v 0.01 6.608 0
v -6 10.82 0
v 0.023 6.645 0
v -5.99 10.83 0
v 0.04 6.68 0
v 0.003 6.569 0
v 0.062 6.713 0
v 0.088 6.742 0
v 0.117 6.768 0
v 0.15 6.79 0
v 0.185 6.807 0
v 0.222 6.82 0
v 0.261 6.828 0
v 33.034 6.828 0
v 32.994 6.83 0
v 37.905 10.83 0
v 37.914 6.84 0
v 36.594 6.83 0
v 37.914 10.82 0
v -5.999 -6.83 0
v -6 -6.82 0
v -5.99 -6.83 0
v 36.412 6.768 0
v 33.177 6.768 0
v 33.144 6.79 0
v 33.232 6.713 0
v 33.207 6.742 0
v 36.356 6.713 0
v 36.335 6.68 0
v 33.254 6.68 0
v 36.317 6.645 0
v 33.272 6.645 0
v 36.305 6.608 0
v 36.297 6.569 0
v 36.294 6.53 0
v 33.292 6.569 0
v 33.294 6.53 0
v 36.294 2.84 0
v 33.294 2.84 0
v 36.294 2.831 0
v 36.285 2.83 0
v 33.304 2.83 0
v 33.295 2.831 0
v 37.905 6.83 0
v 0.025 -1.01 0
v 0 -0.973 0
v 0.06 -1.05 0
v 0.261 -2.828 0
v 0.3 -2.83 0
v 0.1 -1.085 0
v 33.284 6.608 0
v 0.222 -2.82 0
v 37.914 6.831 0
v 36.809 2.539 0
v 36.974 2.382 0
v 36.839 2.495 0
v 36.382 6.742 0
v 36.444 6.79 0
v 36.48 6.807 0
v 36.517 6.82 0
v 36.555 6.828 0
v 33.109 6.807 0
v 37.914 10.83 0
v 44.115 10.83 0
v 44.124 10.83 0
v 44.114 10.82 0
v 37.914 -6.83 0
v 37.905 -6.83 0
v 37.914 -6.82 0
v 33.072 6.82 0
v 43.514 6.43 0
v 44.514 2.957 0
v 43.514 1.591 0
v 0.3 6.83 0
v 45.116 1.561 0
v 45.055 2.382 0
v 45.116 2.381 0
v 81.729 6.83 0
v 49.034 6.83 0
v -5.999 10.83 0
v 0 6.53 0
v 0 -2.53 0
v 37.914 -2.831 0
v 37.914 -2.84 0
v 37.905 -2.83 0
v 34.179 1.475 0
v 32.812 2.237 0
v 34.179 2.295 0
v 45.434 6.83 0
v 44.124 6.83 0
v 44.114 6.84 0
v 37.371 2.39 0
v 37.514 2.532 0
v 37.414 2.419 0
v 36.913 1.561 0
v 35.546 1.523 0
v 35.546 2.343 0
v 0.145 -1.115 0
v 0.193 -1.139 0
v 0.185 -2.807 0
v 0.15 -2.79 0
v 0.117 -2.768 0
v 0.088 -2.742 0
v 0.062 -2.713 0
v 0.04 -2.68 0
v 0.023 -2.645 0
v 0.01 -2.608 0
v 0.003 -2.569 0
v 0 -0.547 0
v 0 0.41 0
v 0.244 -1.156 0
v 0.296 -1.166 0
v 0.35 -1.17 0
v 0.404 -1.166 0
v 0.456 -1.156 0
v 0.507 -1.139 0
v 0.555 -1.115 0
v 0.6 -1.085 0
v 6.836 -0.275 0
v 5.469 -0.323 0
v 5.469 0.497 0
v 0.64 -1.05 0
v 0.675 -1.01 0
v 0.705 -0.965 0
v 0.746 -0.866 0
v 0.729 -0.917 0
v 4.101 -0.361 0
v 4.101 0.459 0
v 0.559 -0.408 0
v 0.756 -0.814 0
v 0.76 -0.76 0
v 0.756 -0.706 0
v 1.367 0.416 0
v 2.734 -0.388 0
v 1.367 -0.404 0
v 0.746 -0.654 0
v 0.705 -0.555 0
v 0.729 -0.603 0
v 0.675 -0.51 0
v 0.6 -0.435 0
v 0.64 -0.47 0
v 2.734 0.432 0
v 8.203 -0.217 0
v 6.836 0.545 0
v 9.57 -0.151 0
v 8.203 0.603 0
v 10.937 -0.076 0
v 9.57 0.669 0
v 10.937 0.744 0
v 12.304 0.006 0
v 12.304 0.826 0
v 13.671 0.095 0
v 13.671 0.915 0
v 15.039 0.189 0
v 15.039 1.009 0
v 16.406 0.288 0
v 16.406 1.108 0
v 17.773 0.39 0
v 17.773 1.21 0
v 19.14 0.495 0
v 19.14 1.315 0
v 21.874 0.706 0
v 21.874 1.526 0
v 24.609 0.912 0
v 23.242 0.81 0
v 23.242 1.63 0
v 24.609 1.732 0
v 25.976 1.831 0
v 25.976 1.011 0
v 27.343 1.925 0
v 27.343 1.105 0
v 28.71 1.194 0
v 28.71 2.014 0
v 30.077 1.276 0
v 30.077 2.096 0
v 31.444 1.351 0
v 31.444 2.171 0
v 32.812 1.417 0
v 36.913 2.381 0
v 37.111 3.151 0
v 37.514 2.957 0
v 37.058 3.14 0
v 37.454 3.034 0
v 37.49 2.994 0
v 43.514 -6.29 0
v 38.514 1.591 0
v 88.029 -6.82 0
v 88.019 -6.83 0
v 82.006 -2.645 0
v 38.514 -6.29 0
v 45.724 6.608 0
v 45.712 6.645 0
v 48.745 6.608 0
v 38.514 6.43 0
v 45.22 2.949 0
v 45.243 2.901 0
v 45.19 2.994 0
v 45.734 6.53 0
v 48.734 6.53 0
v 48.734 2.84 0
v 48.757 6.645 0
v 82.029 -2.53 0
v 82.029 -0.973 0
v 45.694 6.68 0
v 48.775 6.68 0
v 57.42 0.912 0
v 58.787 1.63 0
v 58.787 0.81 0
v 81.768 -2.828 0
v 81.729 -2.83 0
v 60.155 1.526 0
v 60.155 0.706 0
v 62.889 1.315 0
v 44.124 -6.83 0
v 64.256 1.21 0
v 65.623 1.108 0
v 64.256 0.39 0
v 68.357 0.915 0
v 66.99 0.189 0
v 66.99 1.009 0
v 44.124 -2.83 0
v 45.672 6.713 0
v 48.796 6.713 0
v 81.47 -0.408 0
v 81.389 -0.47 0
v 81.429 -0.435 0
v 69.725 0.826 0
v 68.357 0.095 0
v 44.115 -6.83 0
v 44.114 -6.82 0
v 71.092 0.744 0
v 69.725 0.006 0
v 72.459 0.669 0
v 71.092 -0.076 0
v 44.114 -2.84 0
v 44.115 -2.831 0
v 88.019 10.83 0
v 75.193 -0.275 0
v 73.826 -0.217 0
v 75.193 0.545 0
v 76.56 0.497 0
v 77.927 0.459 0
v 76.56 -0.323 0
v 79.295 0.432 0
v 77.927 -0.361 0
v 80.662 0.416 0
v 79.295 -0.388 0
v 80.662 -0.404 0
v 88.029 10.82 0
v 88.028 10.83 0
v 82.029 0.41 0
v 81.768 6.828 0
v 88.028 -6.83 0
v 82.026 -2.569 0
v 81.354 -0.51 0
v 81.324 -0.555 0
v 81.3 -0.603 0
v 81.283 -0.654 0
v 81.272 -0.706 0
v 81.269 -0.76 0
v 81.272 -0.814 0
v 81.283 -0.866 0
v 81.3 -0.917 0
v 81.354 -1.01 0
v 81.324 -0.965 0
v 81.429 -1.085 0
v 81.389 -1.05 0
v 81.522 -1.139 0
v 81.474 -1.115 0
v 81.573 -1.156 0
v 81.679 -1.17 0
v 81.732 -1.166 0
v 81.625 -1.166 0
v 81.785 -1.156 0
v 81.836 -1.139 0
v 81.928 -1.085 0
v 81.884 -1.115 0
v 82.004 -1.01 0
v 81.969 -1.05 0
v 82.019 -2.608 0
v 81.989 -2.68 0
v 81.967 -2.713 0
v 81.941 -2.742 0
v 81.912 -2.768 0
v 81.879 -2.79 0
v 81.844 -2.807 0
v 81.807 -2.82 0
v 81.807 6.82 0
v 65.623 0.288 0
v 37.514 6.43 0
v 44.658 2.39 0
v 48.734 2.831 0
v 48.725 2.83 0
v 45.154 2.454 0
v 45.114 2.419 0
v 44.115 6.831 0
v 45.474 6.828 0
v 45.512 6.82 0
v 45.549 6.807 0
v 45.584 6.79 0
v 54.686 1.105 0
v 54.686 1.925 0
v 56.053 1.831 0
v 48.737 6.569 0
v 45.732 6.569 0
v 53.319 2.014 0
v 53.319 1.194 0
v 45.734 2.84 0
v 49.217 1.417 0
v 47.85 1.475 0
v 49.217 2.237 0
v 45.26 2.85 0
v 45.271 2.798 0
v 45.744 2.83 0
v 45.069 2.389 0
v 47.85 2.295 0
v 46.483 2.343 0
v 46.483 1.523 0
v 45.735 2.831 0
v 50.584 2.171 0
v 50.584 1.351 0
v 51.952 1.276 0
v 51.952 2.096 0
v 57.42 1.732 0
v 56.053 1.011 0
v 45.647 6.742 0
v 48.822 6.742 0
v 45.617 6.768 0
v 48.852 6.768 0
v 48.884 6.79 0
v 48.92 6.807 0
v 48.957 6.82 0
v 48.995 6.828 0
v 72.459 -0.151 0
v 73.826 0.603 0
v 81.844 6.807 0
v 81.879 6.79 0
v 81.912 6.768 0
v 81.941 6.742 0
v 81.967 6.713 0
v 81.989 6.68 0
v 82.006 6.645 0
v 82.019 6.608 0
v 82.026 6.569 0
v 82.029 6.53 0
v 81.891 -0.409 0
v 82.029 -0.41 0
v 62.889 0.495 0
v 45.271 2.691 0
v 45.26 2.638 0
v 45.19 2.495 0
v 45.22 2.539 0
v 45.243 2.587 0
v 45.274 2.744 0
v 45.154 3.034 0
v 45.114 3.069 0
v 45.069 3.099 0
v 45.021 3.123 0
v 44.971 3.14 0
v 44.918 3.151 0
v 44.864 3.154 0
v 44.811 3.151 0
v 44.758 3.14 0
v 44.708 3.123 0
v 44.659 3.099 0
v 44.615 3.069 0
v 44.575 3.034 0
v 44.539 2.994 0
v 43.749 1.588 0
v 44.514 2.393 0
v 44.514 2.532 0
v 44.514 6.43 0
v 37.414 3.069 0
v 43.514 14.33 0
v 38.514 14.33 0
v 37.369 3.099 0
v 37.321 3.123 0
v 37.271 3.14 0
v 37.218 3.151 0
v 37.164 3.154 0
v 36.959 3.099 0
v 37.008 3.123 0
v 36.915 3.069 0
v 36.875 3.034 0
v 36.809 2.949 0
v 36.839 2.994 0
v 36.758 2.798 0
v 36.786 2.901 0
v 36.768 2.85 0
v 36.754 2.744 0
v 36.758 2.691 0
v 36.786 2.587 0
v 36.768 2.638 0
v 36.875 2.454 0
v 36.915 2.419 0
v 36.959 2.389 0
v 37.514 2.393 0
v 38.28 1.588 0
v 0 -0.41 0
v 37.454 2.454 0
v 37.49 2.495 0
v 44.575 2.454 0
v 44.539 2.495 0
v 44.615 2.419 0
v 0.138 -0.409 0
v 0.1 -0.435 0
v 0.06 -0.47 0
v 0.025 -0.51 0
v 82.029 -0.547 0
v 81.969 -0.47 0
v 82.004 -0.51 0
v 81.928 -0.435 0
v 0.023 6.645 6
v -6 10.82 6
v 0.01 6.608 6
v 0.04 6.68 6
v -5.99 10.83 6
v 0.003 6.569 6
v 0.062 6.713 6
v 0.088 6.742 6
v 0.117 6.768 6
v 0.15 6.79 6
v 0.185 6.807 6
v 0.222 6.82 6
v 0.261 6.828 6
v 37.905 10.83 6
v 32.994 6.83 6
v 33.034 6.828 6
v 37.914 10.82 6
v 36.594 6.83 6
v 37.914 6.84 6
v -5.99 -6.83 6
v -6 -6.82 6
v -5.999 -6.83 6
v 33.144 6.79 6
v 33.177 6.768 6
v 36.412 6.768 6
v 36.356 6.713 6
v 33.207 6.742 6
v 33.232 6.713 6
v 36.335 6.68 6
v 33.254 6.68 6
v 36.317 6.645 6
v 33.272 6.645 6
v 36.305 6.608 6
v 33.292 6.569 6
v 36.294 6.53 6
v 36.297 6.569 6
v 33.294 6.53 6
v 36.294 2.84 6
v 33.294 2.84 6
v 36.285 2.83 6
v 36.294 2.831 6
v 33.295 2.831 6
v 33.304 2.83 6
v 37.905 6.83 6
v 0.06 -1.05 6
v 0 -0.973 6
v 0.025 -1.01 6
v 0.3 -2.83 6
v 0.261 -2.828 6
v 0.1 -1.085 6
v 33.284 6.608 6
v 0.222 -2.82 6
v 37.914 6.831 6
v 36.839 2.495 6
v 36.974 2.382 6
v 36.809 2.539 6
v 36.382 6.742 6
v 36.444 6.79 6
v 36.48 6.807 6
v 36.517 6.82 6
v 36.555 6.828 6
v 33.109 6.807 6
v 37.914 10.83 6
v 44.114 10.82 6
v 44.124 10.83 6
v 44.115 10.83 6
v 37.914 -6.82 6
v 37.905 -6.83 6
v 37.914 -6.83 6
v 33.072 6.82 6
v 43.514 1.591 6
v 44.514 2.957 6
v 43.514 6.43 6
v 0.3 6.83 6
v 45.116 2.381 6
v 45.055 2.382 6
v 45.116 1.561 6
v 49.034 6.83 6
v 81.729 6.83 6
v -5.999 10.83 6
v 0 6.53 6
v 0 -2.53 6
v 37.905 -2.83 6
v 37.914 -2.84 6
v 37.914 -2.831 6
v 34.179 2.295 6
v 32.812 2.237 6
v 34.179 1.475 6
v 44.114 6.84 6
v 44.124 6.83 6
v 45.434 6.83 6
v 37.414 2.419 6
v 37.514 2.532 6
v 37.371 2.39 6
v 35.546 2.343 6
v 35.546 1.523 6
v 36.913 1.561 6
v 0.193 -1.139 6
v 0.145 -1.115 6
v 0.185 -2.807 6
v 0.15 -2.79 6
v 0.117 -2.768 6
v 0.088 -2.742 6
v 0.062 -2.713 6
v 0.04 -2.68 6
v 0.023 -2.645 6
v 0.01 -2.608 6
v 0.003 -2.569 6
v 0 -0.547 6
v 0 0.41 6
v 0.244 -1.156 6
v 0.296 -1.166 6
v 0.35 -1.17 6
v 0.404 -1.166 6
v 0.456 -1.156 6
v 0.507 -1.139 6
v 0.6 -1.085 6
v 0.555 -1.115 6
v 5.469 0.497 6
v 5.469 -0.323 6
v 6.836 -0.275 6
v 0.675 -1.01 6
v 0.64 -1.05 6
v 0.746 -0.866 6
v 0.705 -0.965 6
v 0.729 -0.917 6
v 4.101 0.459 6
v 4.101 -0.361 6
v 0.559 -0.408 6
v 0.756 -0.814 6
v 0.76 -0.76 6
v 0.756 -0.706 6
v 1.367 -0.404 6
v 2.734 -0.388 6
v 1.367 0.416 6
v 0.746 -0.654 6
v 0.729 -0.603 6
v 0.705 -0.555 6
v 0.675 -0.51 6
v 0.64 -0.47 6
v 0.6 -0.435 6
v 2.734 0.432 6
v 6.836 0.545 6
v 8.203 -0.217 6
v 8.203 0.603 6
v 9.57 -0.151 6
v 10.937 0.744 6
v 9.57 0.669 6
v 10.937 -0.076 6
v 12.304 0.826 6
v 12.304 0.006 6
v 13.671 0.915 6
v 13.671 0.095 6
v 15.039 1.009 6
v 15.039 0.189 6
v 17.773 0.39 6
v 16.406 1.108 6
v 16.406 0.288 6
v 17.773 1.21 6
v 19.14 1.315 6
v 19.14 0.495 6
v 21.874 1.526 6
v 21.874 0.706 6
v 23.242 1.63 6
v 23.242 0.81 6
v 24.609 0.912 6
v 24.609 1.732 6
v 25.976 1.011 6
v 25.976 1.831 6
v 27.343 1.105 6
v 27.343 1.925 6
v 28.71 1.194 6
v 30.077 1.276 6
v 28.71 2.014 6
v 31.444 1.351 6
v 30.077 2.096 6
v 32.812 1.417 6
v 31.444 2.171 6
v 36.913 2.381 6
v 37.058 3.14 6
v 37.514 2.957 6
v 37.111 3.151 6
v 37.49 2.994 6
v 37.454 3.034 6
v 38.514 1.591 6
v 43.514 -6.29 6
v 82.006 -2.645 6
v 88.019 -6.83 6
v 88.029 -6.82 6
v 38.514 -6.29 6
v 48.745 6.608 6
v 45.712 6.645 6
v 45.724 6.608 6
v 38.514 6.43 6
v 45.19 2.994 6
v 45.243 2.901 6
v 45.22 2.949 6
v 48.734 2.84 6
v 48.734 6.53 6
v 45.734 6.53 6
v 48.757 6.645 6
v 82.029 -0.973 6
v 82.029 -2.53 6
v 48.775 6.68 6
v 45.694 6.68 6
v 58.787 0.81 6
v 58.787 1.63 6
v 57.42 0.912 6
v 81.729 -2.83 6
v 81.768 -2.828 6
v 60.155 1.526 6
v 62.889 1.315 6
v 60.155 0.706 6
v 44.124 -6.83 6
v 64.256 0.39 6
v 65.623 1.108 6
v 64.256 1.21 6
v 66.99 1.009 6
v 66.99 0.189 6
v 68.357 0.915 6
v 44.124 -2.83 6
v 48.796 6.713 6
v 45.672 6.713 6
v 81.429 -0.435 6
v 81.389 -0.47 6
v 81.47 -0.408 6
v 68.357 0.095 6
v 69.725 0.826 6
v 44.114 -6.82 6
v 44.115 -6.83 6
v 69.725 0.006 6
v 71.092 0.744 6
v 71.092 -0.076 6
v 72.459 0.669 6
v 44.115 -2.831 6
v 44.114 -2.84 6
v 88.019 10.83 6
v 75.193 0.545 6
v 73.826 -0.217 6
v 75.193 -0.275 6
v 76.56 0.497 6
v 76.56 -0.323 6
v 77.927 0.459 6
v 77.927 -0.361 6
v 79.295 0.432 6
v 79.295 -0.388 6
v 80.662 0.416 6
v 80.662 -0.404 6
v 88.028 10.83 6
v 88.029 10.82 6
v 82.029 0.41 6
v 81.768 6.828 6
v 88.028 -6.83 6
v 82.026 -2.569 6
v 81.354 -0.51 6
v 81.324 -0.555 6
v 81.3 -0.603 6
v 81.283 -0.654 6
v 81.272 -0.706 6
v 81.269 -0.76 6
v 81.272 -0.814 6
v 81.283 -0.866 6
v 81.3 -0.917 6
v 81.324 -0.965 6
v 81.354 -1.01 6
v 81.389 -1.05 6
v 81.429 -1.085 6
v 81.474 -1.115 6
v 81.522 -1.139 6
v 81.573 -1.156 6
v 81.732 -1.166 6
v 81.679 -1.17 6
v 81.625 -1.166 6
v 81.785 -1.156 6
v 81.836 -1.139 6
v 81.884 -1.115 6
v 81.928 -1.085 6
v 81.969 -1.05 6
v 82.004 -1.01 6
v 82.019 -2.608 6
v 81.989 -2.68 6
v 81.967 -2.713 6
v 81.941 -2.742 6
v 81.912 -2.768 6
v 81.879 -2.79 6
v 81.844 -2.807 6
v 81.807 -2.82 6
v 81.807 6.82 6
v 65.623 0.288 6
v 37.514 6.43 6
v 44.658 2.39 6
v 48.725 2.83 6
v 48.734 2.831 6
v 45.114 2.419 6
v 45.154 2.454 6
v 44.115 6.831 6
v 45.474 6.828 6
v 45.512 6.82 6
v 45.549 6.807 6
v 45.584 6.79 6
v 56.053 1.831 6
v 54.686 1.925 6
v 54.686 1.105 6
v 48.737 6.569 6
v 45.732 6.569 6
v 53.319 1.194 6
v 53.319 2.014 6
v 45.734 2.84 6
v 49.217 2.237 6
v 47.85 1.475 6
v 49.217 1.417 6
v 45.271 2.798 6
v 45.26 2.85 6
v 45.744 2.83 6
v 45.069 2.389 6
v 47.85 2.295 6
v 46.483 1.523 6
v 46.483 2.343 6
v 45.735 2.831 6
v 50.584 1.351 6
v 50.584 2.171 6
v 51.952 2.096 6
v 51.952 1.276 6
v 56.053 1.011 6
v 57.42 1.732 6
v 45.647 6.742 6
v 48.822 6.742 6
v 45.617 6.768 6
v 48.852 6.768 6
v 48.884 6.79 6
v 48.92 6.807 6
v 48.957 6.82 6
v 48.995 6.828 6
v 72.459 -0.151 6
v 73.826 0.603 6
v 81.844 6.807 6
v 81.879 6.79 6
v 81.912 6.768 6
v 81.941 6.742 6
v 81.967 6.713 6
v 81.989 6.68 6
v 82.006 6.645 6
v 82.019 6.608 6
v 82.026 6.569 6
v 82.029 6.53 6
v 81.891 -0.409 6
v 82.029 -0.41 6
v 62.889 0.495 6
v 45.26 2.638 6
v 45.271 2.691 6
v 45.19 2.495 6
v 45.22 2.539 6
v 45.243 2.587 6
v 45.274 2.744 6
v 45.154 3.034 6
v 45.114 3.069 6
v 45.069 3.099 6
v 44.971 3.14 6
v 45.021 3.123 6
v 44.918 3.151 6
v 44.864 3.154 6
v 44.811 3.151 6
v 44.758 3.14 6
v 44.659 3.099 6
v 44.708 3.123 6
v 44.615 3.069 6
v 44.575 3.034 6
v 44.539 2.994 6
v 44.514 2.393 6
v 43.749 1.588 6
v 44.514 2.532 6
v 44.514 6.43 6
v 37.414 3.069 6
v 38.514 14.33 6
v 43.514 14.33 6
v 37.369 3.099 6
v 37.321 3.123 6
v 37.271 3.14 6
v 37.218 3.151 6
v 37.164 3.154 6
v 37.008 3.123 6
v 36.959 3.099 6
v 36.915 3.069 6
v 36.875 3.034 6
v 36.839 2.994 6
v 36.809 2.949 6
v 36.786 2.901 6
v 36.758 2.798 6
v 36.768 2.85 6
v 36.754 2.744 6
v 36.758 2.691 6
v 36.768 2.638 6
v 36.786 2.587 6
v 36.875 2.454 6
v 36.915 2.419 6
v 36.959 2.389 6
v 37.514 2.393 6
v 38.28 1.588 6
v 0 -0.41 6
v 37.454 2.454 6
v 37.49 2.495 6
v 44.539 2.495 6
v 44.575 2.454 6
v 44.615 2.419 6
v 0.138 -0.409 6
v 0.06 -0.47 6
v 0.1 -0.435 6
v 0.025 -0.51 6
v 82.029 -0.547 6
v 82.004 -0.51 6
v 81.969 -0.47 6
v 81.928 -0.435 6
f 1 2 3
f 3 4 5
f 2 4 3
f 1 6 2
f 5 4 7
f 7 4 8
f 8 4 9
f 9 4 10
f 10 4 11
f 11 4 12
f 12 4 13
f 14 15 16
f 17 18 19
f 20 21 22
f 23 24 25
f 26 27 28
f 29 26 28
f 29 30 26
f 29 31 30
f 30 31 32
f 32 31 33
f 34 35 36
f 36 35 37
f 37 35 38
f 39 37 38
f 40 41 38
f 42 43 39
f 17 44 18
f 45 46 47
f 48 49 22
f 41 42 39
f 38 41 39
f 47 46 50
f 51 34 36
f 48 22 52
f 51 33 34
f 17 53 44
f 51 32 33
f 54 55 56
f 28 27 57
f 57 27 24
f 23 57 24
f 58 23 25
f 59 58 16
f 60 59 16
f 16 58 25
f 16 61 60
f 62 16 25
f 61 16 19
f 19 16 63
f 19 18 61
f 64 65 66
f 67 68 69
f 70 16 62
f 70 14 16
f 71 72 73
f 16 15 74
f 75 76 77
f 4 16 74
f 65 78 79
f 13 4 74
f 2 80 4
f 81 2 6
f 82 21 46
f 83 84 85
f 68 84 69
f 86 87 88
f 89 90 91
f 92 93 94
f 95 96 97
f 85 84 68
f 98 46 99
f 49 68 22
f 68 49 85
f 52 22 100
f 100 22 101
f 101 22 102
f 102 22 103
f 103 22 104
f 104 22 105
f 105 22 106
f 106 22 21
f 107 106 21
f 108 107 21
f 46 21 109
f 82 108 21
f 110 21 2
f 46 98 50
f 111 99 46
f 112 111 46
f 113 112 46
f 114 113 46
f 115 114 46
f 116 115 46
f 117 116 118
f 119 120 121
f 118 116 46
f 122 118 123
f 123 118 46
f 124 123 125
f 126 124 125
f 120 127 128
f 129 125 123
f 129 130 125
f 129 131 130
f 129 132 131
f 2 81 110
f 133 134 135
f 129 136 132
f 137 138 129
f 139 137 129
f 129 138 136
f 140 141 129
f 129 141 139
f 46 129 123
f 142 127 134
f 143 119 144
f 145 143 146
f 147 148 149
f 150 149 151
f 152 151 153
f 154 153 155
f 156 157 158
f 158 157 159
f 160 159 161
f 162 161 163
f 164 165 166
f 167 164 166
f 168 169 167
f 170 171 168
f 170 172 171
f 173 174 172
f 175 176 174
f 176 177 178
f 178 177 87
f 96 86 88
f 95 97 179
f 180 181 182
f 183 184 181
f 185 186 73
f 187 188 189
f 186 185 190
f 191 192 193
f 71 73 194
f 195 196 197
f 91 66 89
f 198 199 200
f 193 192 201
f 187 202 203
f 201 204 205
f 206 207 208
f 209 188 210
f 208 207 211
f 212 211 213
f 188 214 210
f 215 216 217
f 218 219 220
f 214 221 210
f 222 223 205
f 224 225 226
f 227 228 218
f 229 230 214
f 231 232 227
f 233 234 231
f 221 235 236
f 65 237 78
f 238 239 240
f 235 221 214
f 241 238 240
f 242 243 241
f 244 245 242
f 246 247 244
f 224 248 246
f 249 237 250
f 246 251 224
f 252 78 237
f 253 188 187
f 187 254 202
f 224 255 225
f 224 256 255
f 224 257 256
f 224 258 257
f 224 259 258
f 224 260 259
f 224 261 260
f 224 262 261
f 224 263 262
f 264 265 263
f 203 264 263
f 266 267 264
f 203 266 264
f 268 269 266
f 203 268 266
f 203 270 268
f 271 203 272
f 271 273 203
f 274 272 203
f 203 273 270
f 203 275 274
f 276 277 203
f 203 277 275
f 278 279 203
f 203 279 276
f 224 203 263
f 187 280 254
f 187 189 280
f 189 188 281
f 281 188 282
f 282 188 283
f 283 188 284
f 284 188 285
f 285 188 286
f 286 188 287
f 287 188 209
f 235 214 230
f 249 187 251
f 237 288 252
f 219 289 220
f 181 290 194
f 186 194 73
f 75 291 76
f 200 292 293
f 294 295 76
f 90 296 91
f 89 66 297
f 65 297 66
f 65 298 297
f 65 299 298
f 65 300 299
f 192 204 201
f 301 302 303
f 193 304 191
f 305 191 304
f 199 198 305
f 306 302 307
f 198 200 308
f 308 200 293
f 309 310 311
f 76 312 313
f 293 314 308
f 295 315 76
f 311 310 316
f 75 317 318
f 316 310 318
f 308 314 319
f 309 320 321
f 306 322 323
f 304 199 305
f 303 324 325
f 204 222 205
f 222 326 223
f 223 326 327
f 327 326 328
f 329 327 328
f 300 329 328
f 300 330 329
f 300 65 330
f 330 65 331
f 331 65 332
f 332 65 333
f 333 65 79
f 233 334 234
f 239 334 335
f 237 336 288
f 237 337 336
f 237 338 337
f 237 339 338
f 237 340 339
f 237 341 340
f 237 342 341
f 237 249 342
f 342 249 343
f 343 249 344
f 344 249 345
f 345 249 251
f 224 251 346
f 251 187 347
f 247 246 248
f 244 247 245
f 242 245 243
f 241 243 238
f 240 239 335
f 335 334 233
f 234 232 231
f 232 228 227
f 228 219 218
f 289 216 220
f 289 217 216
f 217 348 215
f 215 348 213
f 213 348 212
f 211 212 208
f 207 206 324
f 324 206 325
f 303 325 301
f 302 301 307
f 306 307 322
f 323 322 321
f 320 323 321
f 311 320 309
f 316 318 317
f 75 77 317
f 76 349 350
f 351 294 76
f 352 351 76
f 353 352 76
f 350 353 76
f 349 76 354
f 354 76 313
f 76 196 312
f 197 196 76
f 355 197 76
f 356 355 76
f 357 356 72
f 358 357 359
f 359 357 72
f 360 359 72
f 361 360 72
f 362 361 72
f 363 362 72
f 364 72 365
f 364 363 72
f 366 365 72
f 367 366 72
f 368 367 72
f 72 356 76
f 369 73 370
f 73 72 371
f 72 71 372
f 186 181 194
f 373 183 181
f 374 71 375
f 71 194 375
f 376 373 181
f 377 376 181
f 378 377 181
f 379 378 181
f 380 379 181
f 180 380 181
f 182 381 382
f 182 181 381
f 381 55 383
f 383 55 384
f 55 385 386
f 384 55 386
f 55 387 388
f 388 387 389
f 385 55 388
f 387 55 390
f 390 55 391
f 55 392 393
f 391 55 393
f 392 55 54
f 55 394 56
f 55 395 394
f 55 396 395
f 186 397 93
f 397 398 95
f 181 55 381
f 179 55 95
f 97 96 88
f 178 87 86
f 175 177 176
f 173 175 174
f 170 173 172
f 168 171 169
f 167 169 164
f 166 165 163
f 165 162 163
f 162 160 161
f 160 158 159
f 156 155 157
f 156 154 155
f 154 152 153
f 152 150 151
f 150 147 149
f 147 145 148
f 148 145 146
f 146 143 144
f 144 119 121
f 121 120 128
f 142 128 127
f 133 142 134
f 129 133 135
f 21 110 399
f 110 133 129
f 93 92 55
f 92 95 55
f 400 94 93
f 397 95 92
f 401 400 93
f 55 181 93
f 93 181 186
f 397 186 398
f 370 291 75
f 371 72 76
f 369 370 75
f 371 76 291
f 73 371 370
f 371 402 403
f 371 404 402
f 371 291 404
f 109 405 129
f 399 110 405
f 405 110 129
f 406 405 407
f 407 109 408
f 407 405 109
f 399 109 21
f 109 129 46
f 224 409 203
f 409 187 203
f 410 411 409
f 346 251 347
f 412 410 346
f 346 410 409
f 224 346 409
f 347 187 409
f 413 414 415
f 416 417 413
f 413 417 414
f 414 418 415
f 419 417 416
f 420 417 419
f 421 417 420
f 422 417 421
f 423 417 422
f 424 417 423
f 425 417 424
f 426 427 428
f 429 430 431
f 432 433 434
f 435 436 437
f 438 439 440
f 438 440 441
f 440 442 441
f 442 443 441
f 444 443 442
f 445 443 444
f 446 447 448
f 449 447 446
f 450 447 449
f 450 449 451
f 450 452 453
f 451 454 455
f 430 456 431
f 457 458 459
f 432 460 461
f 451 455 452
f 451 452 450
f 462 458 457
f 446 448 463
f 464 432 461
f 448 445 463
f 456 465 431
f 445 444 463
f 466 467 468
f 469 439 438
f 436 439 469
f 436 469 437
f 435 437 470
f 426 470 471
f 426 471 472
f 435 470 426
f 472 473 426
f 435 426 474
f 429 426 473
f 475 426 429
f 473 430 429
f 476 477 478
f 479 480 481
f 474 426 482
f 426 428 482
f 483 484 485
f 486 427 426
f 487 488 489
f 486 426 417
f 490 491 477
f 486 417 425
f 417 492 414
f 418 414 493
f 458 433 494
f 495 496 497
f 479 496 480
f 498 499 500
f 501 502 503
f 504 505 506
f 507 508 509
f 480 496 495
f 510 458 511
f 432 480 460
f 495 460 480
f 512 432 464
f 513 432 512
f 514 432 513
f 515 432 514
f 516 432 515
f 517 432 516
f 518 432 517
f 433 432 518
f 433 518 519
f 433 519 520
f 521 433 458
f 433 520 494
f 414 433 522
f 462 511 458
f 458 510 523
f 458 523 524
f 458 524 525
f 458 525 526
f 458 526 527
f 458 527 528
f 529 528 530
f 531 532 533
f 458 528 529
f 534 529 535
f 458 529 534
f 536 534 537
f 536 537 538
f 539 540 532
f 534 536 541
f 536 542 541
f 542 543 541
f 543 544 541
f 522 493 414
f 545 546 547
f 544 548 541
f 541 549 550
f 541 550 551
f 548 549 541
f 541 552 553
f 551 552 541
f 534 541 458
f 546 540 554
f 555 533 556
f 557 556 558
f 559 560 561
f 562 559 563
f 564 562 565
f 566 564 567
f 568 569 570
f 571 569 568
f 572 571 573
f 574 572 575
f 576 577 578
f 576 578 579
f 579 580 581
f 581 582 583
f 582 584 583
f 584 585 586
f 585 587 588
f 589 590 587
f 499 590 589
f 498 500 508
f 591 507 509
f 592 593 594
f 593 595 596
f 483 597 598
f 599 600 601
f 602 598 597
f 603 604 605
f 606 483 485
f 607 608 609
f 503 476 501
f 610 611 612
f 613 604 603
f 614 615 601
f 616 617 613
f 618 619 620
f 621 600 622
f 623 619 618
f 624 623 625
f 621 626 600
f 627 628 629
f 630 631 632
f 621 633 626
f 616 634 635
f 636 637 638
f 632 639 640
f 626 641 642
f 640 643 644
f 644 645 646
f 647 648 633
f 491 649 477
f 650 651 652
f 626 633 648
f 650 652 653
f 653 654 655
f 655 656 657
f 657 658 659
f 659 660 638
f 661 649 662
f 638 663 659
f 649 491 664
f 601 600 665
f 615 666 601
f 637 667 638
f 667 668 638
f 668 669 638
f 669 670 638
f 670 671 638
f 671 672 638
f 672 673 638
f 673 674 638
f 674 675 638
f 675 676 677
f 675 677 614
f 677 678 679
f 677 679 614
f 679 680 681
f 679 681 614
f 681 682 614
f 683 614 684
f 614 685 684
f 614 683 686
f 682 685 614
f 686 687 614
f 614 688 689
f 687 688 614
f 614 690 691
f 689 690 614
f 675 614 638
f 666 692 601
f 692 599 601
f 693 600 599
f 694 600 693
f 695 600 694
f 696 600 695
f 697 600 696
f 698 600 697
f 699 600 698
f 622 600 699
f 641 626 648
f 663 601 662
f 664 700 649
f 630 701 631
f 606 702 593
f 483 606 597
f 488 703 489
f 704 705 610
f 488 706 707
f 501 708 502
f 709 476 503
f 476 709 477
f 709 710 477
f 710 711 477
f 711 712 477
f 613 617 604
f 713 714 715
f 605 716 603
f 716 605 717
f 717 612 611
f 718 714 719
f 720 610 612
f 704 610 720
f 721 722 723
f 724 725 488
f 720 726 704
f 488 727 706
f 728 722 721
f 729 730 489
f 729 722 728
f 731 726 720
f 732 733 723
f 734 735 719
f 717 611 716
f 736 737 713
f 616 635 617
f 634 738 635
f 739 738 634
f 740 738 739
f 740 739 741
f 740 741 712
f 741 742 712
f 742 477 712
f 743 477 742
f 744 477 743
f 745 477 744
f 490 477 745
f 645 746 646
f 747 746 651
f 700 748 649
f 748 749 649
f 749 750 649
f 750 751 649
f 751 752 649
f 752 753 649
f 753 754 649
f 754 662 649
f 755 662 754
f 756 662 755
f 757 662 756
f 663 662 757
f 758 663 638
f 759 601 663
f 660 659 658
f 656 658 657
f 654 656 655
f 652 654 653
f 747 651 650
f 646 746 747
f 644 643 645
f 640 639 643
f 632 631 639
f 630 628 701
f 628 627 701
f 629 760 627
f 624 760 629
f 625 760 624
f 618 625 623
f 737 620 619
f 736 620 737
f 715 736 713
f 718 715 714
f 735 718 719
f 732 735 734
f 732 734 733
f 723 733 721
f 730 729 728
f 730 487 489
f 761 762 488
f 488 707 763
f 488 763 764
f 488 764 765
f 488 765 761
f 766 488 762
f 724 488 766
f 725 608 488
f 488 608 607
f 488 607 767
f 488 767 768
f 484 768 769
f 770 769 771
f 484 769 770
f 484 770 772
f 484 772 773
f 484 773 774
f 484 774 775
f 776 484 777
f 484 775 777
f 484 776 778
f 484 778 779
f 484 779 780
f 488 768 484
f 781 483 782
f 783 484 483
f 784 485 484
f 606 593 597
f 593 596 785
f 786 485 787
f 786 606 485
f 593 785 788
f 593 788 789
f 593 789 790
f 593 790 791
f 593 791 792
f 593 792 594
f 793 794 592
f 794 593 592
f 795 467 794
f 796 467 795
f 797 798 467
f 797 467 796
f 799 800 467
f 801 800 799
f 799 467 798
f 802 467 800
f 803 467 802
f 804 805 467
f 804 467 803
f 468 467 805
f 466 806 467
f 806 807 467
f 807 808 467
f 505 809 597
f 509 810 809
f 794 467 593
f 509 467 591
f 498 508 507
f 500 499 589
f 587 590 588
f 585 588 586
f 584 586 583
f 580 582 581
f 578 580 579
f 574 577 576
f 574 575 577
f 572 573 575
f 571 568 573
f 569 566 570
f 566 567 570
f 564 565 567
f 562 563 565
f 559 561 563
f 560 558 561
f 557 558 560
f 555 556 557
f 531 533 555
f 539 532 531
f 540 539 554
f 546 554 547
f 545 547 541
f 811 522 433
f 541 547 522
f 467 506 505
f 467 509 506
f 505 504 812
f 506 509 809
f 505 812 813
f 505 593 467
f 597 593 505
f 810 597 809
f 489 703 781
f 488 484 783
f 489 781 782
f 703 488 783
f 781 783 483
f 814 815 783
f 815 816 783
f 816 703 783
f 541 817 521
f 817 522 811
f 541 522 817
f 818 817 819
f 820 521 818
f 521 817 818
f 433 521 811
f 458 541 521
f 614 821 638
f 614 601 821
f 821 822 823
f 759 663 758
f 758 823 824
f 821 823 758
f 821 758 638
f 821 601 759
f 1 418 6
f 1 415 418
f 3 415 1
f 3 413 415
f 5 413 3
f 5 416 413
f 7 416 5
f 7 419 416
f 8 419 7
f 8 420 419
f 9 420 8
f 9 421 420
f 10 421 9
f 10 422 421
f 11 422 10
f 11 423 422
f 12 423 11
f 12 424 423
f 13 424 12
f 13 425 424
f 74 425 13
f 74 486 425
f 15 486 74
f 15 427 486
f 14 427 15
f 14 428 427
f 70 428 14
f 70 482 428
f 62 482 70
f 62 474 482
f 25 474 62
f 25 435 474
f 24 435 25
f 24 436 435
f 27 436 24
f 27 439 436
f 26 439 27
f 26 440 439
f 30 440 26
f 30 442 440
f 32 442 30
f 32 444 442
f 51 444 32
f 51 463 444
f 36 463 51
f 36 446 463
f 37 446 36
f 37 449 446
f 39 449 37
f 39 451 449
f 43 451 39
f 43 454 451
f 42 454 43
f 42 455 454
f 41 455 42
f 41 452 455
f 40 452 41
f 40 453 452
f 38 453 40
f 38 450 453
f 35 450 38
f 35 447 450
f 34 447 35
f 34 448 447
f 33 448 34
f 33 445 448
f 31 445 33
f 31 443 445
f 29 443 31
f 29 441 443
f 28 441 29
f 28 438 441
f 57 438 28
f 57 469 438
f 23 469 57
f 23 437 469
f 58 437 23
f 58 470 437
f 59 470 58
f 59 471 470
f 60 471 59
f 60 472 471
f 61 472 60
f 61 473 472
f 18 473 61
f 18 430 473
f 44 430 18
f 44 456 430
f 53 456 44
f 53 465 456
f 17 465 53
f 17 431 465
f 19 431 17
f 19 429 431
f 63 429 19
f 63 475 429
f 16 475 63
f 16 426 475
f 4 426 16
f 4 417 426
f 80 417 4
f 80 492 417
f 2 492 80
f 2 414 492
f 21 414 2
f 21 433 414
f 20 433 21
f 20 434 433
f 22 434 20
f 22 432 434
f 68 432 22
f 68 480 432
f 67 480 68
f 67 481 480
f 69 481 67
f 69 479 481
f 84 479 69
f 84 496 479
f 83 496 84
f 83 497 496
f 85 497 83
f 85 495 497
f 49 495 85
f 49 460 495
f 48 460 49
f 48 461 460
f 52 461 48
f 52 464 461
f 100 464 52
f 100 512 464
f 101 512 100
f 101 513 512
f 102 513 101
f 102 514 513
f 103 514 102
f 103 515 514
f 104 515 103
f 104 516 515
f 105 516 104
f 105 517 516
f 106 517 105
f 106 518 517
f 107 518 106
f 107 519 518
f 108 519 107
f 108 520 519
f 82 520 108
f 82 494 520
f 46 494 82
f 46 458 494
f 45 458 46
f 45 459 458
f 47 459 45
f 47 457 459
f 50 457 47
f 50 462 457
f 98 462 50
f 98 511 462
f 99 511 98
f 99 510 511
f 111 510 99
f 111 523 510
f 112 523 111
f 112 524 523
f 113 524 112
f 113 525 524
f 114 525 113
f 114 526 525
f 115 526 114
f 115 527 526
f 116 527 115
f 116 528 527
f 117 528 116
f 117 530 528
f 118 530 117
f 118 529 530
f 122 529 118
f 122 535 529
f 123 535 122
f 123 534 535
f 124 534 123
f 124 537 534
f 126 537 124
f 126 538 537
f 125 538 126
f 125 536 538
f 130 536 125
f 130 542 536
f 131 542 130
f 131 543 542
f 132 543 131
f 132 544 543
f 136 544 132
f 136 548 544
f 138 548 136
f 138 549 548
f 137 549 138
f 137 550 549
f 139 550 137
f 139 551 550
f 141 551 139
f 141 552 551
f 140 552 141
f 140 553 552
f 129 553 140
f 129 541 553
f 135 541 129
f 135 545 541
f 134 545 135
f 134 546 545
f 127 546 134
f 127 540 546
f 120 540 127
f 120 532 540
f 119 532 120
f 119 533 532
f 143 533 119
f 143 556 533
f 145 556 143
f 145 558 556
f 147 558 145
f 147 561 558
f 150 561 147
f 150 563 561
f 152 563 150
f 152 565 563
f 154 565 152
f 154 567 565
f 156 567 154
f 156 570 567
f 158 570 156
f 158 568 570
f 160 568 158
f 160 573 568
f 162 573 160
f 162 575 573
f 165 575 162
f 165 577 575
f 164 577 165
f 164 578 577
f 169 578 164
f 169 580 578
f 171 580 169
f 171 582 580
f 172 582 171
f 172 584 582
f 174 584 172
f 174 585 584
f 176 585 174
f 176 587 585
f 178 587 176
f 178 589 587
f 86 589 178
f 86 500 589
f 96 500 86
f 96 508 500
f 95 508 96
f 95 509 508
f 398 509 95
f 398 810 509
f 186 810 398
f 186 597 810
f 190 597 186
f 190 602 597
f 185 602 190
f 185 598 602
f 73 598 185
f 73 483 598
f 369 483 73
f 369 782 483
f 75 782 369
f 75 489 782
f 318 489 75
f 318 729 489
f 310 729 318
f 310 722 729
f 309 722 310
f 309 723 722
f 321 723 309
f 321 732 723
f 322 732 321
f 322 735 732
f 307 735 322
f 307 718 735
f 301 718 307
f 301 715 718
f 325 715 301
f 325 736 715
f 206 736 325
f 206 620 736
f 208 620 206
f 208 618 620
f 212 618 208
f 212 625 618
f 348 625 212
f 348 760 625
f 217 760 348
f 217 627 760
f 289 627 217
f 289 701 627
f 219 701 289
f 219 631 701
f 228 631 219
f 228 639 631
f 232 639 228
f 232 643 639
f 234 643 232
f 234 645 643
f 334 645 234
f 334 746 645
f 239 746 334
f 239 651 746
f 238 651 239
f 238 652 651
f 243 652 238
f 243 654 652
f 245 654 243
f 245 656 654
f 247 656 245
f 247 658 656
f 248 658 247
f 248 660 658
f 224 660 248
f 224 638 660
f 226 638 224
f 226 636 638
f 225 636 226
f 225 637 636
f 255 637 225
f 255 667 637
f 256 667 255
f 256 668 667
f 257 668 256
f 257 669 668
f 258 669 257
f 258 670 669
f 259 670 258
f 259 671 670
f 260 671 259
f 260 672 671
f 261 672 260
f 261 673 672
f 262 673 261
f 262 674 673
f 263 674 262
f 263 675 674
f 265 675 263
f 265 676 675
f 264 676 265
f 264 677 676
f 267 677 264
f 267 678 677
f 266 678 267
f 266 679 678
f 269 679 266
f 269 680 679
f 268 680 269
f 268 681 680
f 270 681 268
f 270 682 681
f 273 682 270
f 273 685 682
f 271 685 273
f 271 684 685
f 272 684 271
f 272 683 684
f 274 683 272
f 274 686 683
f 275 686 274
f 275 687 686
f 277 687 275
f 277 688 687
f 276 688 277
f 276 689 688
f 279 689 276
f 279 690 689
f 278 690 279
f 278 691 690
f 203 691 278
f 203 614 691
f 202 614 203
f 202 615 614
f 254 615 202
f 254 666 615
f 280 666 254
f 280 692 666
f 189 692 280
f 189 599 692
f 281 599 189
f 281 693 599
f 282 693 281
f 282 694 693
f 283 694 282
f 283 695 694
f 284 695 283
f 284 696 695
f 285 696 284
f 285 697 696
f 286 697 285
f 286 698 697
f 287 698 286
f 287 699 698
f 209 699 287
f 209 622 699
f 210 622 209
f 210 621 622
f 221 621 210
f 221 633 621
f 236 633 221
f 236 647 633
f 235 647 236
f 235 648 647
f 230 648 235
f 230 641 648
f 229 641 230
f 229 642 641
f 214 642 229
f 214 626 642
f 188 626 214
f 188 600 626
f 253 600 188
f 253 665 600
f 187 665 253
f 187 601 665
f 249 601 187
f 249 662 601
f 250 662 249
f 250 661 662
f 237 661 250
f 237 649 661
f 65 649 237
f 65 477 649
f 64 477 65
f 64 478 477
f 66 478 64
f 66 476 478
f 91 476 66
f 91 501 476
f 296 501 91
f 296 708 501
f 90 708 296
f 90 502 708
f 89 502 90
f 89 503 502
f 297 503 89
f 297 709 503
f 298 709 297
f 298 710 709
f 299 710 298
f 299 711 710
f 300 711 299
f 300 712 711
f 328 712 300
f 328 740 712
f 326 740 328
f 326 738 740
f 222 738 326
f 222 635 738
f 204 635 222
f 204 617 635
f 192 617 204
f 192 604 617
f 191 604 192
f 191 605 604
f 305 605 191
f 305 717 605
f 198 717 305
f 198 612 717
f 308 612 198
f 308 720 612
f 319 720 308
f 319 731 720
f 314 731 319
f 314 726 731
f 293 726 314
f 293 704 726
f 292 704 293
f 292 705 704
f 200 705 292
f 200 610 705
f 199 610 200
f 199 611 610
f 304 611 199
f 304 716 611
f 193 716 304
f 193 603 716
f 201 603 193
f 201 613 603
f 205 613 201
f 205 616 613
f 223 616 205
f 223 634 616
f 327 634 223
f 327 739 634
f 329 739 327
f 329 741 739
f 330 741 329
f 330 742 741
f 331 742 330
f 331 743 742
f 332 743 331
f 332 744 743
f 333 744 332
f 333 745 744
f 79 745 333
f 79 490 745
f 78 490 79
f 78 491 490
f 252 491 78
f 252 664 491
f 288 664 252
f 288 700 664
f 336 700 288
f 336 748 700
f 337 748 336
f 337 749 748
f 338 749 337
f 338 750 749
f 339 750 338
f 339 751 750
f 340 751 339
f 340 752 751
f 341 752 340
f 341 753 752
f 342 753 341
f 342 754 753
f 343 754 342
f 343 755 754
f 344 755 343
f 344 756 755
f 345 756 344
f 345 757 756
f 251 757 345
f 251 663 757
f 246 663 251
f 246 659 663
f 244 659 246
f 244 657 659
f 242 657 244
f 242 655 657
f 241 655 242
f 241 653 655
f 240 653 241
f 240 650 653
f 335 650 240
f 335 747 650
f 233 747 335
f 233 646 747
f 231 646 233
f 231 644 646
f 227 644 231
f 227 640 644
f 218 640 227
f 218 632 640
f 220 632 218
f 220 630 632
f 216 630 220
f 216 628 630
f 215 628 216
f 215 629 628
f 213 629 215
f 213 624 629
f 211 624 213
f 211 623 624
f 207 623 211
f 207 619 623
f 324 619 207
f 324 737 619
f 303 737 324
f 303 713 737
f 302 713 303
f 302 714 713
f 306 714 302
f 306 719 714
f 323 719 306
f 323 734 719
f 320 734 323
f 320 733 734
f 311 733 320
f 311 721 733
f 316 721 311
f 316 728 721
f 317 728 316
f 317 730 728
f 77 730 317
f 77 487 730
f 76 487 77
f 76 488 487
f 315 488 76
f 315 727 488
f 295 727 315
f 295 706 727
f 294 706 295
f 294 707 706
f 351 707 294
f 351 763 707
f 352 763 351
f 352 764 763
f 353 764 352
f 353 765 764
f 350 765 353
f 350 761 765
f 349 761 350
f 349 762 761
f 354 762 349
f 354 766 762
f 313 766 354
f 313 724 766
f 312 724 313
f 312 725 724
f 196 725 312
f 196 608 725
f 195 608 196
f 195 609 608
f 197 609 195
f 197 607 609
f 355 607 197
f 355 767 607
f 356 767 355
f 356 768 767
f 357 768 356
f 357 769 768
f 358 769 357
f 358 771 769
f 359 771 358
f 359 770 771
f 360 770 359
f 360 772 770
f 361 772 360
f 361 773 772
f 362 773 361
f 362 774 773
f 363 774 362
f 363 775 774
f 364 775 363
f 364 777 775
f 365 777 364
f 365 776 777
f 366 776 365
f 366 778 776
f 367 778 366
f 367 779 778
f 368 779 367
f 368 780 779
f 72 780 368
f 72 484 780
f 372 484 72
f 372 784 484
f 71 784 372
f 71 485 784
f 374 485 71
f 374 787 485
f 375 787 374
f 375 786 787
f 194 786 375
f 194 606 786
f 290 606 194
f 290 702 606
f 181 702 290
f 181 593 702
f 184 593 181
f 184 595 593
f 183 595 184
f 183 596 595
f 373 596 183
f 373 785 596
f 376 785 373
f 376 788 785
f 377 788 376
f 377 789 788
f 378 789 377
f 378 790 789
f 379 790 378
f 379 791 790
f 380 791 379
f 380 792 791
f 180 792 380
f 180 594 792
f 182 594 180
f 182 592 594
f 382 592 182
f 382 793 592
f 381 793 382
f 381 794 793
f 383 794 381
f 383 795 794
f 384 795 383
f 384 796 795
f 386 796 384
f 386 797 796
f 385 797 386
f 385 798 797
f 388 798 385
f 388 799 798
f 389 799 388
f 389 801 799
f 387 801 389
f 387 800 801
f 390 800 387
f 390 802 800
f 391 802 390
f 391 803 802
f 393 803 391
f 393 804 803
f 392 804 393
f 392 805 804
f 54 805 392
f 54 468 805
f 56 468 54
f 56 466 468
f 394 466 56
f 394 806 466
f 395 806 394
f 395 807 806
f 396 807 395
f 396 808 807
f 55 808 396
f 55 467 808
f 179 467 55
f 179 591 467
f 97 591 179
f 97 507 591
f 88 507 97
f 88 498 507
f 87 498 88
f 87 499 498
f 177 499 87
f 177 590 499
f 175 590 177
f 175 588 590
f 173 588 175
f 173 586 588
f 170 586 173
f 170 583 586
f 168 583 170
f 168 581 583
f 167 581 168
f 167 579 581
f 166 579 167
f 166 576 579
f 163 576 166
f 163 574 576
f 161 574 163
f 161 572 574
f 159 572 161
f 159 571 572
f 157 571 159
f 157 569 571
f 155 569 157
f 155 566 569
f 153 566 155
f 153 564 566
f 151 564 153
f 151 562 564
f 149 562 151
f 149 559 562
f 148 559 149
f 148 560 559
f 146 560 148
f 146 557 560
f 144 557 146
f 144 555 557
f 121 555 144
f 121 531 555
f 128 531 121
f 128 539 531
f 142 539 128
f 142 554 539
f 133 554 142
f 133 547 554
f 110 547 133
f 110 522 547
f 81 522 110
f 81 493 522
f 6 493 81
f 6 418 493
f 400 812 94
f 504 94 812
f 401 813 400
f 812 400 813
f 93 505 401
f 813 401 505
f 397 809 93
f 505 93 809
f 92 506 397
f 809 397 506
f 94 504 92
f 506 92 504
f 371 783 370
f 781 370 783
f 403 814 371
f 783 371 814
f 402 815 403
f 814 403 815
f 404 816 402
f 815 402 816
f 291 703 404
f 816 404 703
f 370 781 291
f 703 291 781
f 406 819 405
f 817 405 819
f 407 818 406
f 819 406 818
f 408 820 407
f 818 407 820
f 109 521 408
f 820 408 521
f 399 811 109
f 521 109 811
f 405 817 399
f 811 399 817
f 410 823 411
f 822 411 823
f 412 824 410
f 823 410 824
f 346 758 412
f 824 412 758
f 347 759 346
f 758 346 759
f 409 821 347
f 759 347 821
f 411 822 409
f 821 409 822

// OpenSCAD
// bistable-toggle — a fixed–fixed pre-buckled arch that snaps between two
// stable states. Reference design for docs/advanced-techniques.md Domain 1
// (compliant mechanisms) → bistable & constant-force, and CC1.
//
// A fixed–fixed buckled arch has two stable states (bowed up / bowed down)
// separated by a negative-stiffness region: power is needed only to SWITCH, not
// to HOLD. Press the proud push stem past flat and the arch snaps to the other
// state and stays. The stems are a mirrored pair riding the arch centre through
// windows in the lid and base bar: whichever state the toggle is in, exactly
// one stem stands proud of the cage, and pressing it is the next switch — one
// motion of one finger, in both states (PR #406 review: a caged nub with no
// reachable push face reads as welded — a dead button). Latches, closures,
// tactile toggles.
//
// DIMENSIONED FROM TARGETS (issue #389), not by feel. Pick the switch force
// f_s and travel u_tr, then invert the doc's two nondimensional constants
// (fixed–fixed shallow arch, I = w·t³/12):
//   switch force   f_s · l³ / (E·I·h) = 1486.57
//   travel         u_tr / h           = 1.98
// Defaults f_s = 3 N, u_tr = 4 mm, E = 2 GPa (PETG datum) give
//   h = u_tr/1.98 = 2.02 mm               (mid_rise, derived below)
//   t = 0.82 mm — bistability needs h/t ≥ 2.3, capping t at 0.878 mm, and the
//        repo floor is 0.8 (two perimeters): the window is [0.8, 0.878], and
//        0.82 sits a hair above the floor so the curved band's normal-ray
//        wall samples clear the 0.8 mm thin-wall check
//   l = (1486.57·E·I·h/f_s)^(1/3) ≈ 82 mm (span, derived below)
// main() re-derives f_s and u_tr from the built parameters and echoes them, so
// the solve cannot silently drift; NOTES.md "The solve" records the chain.
//
// BISTABILITY CONDITION: a fixed–fixed arch is only bistable when the rise is
// tall enough vs the beam thickness (mid_rise/beam_t ≳ 2.3). Asserted below —
// too flat and it just springs back (monostable). The coupon (part = "sweep")
// prints four cells across that threshold, two deliberately monostable, so you
// can feel where bistability dies on your printer.
//
// HARD STOPS (the doc's fatigue rule: the real limit is off-axis overload, not
// primary-DOF motion): the nub travels in a rigid cage — the lid above limits
// +Y over-travel, the base bar below limits −Y, and two rails hanging from the
// lid flank the raised nub to limit ±X shoves. The rails stop `stop_gap` above
// the arch's maximum reach: the arch sweeps through every interior x between
// states, so a stop reaching any lower would weld the mechanism solid. Z
// (out-of-plane) is left to geometry: that axis is (w/t)² ≈ 56× stiffer than
// the flexure axis. The `fitcheck` part proves the cage clears the arch's and
// nub's FULL travel; `fitcheck_neg` proves that check can fail.
//
// PUSH ACCESS vs STOP DUTY (the PR #406 reconciliation — stops moved OUTSIDE
// the push column): the lid and base bar carry stem windows, so the +Y stop is
// no longer the full lid over the nub — it is the nub's shoulders (the
// nub[0]-wide body outboard of the stem) catching the lid-window JAMBS, at the
// same `stop_gap`. The −Y stop stays the arch underside meeting the base bar,
// now at the jambs beside its window: first contact ≈ stop_gap + the arch's
// curvature drop across the half-window (≈ 0.03 mm here — sub-layer noise,
// stated rather than compensated with an unprintable 0.03 mm ledge). The stems
// carry NO root gussets, deliberately: their roots sit inside the nub-
// rigidized centre span (|x−l/2| ≤ nub[0]/2) where cyclic strain is ~zero, and
// gusset bumps there would demand windows too wide to keep the nub→jamb stop.
// The stem↔jamb clearance is `stem_clear` > stop_gap so the ±X rails always
// bite before a stem can touch its jamb — the stops keep their designed order.
//
// PRINT FLAT. The profile is in XY; the arch snaps in-plane, so bending stress
// runs across the roads within a layer — the #1 flexure rule. The stop cage
// too is pure profile: every feature prints face-down on the bed, no bridges,
// no supports. All dims in mm.

/* [Targets — the geometry solves from these] */
// Target switch force f_s (N) — finger-comfortable toggle (brief #389)
target_fs = 3;
// Target centre travel u_tr (mm) — a positive, feelable click
target_utr = 4;
// Young's modulus (MPa). PETG ≈ 2000 — the datum the force solve uses; the
// echoed f_s is a prediction to verify with the coupon, not a guarantee.
E = 2000;

/* [Arch] */
// Mid-rise h (mm) — derived: u_tr / 1.98. Bigger = firmer snap, more travel.
mid_rise = target_utr / 1.98;
// Arch beam thickness t (mm) — bistability (h/t ≥ 2.3) caps it at 0.878 and
// the repo's two-perimeter floor is 0.8; 0.82 sits just off the floor so the
// curved band's normal-ray wall samples clear the 0.8 mm thin-wall check.
beam_t = 0.82;
// Out-of-plane width w (mm) = extrude height Z. Brief floor: w ≥ 3.
width = 6;
// Clamped span l (mm) — derived from target_fs: cbrt(1486.57·E·I·h/f_s)
span = pow(1486.57 * E * (width * pow(beam_t, 3) / 12) * mid_rise / target_fs, 1 / 3);

/* [Frame & stops] */
// Post width at each clamped end, X (mm)
post_w = 6;
// Frame wall thickness (posts, base bar, lid) (mm)
frame_wall = 4;
// Stock thickness of the ±X stop rails (mm)
rail_w = 3;
// Travel past the stable state / off-axis rest before a hard stop bites (mm)
stop_gap = 0.4;
// Centre push-nub size [width X, height Y above the arch] (mm). The nub body
// is the +Y over-travel stop: its top catches the lid-window jambs at stop_gap
nub = [7, 4];
// Push stem [width X, proud height beyond the cage's outer face] (mm) — the
// button. One stem rises from the nub through the lid window, its mirror
// drops from the arch centre through the base-bar window; whichever state the
// toggle is in, one stem stands proud to take the next press. Proud height
// must EXCEED the snap-through travel (= the cell's rise h) or the fingertip
// bottoms on the cage face before the arch crosses flat — asserted per cell
stem = [5, 3.5];
// Stem↔window-jamb X clearance (mm) — deliberately > stop_gap so the ±X rails
// (at stop_gap) always bite before a stem can touch its window jamb
stem_clear = stop_gap + 0.2;

/* [Quality] */
$fn = 48;

// ---- derived predictions (echoed; the asserts hold them to the targets) ----
fs_pred = 1486.57 * E * (width * pow(beam_t, 3) / 12) * mid_rise / pow(span, 3);
NS = 60;                                      // arch samples
win_half = stem[0]/2 + stem_clear;            // stem-window half-width in X

// ---- geometry (all 2D in the XY profile; `width` is the extrusion) --------
// fixed–fixed first-mode arch centreline
function yc(x, l, h) = h * (1 - cos(360 * x / l)) / 2;

module arch_beam_2d(l, h, t) {
    top = [for (i = [0 : NS]) let (x = l * i / NS) [x, yc(x, l, h) + t/2]];
    bot = [for (i = [NS : -1 : 0]) let (x = l * i / NS) [x, yc(x, l, h) - t/2]];
    polygon(concat(top, bot));
}

module nub_2d(l, h, t) {
    // the nub body — its top face is the +Y over-travel stop, catching the
    // lid-window jambs (the lid outboard of win_half) at stop_gap
    translate([l/2 - nub[0]/2, h - t/2]) square([nub[0], t + nub[1]]);
    // the push stems (the PR #406 fix, in the module so every coupon cell
    // inherits it). A stem shorter than the snap-through travel h is a dead
    // button: the fingertip bottoms on the cage face while the arch is still
    // on the near side of flat, and it springs back.
    assert(stem[1] > h + 0.5,
           str("push stem proud height ", stem[1], " must exceed the snap-through travel h = ",
               h, " by ≥ 0.5 or the finger bottoms on the cage before the arch crosses flat"));
    // top stem: from the nub top through the lid window, proud of the lid's
    // outer face by stem[1] in state 1 (the state it switches)
    translate([l/2 - stem[0]/2, h - t/2])
        square([stem[0], t + nub[1] + stop_gap + frame_wall + stem[1]]);
    // bottom stem: from the arch underside through the base-bar window, proud
    // of the base's outer face by stem[1] in state 2 (2h below as-printed).
    // No root gussets on either stem: the roots sit inside the nub-rigidized
    // centre span where cyclic strain is ~zero (see the header)
    stem_y0 = base_top(h, t) - frame_wall - stem[1] + 2*h;
    translate([l/2 - stem[0]/2, stem_y0])
        square([stem[0], (h + t/2) - stem_y0]);
}

module beam_gussets_2d(l, h, t) {
    // flexure-root fillets, r = 0.5t (the doc's minimum). Each disc sits
    // `bite` PAST the faces it joins, never tangent to them: a tangent-only
    // disc touches the union at a single point, pinching the polygon and
    // leaving naked edges in the mesh (the coupon render failure that bit this
    // module before `bite`). 0.06 mm is ~200× the $fn=48 arc error, so the
    // fillet still reads as tangent.
    rf = t / 2;
    bite = 0.06;
    // roots: the concave notch where the beam underside leaves each post face
    for (gx = [rf - bite, l - rf + bite])
        translate([gx, -t/2 - rf + bite]) circle(rf);
    // nub base: the corner where each nub side rises off the beam top
    for (sx = [-1, 1])
        let (fx = l/2 + sx * nub[0]/2)
            translate([fx + sx * (rf - bite), yc(fx, l, h) + t/2 + rf - bite])
                circle(rf);
}

function base_top(h, t) = -(h + t/2 + stop_gap);   // the −Y hard-stop face
function lid_bottom(h, t) = h + t/2 + nub[1] + stop_gap;  // the +Y hard-stop face

module frame_2d(l, h, t) {
    y0 = base_top(h, t) - frame_wall;
    y1 = lid_bottom(h, t) + frame_wall;
    difference() {
        union() {
            // posts (the clamps), full height to the lid
            translate([-post_w, y0]) square([post_w, y1 - y0]);
            translate([l, y0]) square([post_w, y1 - y0]);
            // base bar (−Y over-travel stop) and lid (+Y over-travel stop):
            // both windowed below — the stops live on the jambs
            translate([-post_w, y0]) square([l + 2*post_w, frame_wall]);
            translate([-post_w, lid_bottom(h, t)]) square([l + 2*post_w, frame_wall]);
        }
        // stem windows: open the lid and the base bar over the push column.
        // stem_clear per side in X (wider than stop_gap, so the ±X rails bite
        // first); cut 0.5 past each face so the difference is robust
        for (wy = [y0 - 0.5, lid_bottom(h, t) - 0.5])
            translate([l/2 - win_half, wy])
                square([2 * win_half, frame_wall + 1]);
    }
}

module x_rails_2d(l, h, t) {
    // ±X stop rails, hanging from the lid: they flank the raised nub so a
    // sideways shove cannot walk it off its line, and stop `stop_gap` above
    // the arch's maximum reach (h + t/2) — the arch sweeps through every
    // interior x between states, so a rail any lower would weld the mechanism.
    // The inner face clears the nub's gusset bumps, not the bare nub face: a
    // disc-union gusset protrudes 2·rf past the face (a true tangent fillet
    // would protrude rf), i.e. t − bite in practice — rails at bare-nub +
    // stop_gap sat exactly on the bump crests and fused the mechanism solid
    // (the bodies:1 weld caught at iteration 2)
    inner = nub[0]/2 + t + stop_gap;            // rail inner face off centre
    for (x0 = [l/2 - inner - rail_w, l/2 + inner])
        translate([x0, h + t/2 + stop_gap])
            square([rail_w, lid_bottom(h, t) - (h + t/2 + stop_gap)]);
}

module cage_2d(l, h, t) {
    frame_2d(l, h, t);
    x_rails_2d(l, h, t);
}

module toggle_2d(l, h, t) {
    // close-op rounds the cage's concave corners (r kept under t/2 so the thin
    // beam would survive the inward offset were it in this group); the beam
    // gets its own explicit 0.5t root fillets instead
    offset(r = -0.3) offset(r = 0.3) cage_2d(l, h, t);
    union() {
        arch_beam_2d(l, h, t);
        nub_2d(l, h, t);
        beam_gussets_2d(l, h, t);
    }
}

module toggle(l, h, t, w) {
    linear_extrude(w) toggle_2d(l, h, t);
}

// the nub's full designed Y travel, grown by `m` — including its gusset
// bumps, which reach (t − bite) past each nub face: the sweep must model the
// solid that actually moves, or a stop sitting on a bump crest reads clear
// here while the printed part is fused (the iteration-2 lesson)
module nub_sweep_2d(l, h, t, m = 0) {
    xh = nub[0]/2 + t + m;                      // half-extent incl. gussets
    translate([l/2 - xh, -(h + t/2) - m])
        square([2 * xh, 2*(h + t/2) + nub[1] + 2*m]);
    // the push stems' full designed travel: one column spanning both stems'
    // reach through the lid and base windows — top stem up to its state-1
    // proud face, bottom stem down to its state-2 proud face. Bare stem
    // width: the stems carry no gusset bumps (see nub_2d), so the solid that
    // moves through the windows really is stem[0] wide.
    sw_y0 = base_top(h, t) - frame_wall - stem[1];
    sw_y1 = lid_bottom(h, t) + frame_wall + stem[1];
    translate([l/2 - stem[0]/2 - m, sw_y0 - m])
        square([stem[0] + 2*m, sw_y1 - sw_y0 + 2*m]);
}

// everything that moves — the arch band mirrored through the snap (state 2 is
// state 1 reflected about the chord) plus the nub riding the apex — grown by
// `m`. What the cage must clear; `m > 0` is the negative control's overlap.
module travel_sweep_2d(l, h, t, m = 0) {
    nub_sweep_2d(l, h, t, m);
    polygon(concat(
        [for (i = [0 : NS]) let (x = l * i / NS) [x,  yc(x, l, h) + t/2 + m]],
        [for (i = [NS : -1 : 0]) let (x = l * i / NS) [x, -yc(x, l, h) - t/2 - m]]));
}

// ---- the coupon: h/t swept across the bistability threshold ---------------
// Four cells at l = 35 (quick print), t = 0.82 = production. Ratios 3.0 and
// 2.53 (production) are bistable; 2.0 and 1.5 are deliberately monostable —
// the negative controls. Feel the snap die as h shrinks; the label on each
// base bar is its mid_rise/beam_t ratio.
sweep_l = 35;
sweep_cells = [               // [label, h]: cell 2 IS the production mid_rise
    // no "0" glyphs in the labels — a 0's enclosed counter cuts loose as a
    // floating chip in the bar (found as 2 stray 17 mm³ shells at iteration 3)
    ["3", 3.0 * beam_t], ["2.5", mid_rise], ["2", 2.0 * beam_t], ["1.5", 1.5 * beam_t],
];

module coupon_strip() {
    for (i = [0 : len(sweep_cells) - 1]) {
        h = sweep_cells[i][1];
        cell_w = sweep_l + 2*post_w;
        translate([i * (cell_w + 3), 0, 0])
            linear_extrude(width)
            difference() {
                toggle_2d(sweep_l, h, beam_t);
                // baseline 1.1 above the bar's bottom edge (the period glyph
                // dips ~0.28 below the baseline — the bar strip under it must
                // stay ≥ 0.8 mm), spacing 1.5 because the period kerns tight
                // against the next digit and left a ~0.04 mm wall in the gap
                // (the iteration-4/5 warnings). Right-aligned 1.0 left of the
                // base-bar stem window (PR #406): a centred label would land
                // inside the window cut and vanish — 1.0, not less, keeps the
                // glyph→window wall above the 0.8 mm floor.
                translate([sweep_l/2 - win_half - 1.0,
                           base_top(h, beam_t) - frame_wall + 1.1])
                    text(sweep_cells[i][0], size = 3.2, halign = "right", spacing = 1.5);
            }
    }
}

// "" = the toggle. "sweep" = the print-this-first coupon. "fitcheck" = the
// mechanism's full travel (arch through both states + nub) ∩ the stop cage
// (must be EMPTY — the cage bites only on over-travel/off-axis load, and this
// is the check that catches a stop placed where the arch sweeps). "fitcheck_
// neg" = that travel grown past the stops (must be NON-EMPTY — proves the
// check can fail). See ci.fitchecks.
part = "";

module main() {
    assert(mid_rise / beam_t >= 2.3,
           "arch too flat to be bistable (mid_rise/beam_t < 2.3) — it would just spring back");
    assert(beam_t >= 0.8, "arch beam under the two-perimeter floor (0.8 mm)");
    assert(width >= 3, "out-of-plane width under the brief's 3 mm floor");
    assert(span / mid_rise >= 10,
           "arch not shallow enough for the fixed–fixed constants (l/h < 10)");
    assert(abs(fs_pred - target_fs) < 0.05,
           str("solve drifted: echoed f_s = ", fs_pred, " N vs target ", target_fs, " N"));
    assert(stem[0] >= 0.8, "push stem under the two-perimeter floor (0.8 mm)");
    assert(stem_clear > stop_gap,
           "stem_clear must exceed stop_gap or the window jambs, not the ±X rails, become the X stop");
    assert(nub[0]/2 - win_half >= 0.2,
           "lid-window jambs no longer catch the nub — the +Y over-travel stop is gone");
    echo(str("predicted switch force f_s ≈ ", fs_pred, " N  (target ", target_fs, " N)"));
    echo(str("predicted centre travel u_tr ≈ ", 1.98 * mid_rise, " mm  (target ", target_utr, " mm)"));

    if (part == "sweep")
        coupon_strip();
    else if (part == "fitcheck")
        linear_extrude(width)
            intersection() { cage_2d(span, mid_rise, beam_t); travel_sweep_2d(span, mid_rise, beam_t); }
    else if (part == "fitcheck_neg")
        linear_extrude(width)
            intersection() { cage_2d(span, mid_rise, beam_t); travel_sweep_2d(span, mid_rise, beam_t, stop_gap + 0.3); }
    else
        toggle(span, mid_rise, beam_t, width);
}

main();
